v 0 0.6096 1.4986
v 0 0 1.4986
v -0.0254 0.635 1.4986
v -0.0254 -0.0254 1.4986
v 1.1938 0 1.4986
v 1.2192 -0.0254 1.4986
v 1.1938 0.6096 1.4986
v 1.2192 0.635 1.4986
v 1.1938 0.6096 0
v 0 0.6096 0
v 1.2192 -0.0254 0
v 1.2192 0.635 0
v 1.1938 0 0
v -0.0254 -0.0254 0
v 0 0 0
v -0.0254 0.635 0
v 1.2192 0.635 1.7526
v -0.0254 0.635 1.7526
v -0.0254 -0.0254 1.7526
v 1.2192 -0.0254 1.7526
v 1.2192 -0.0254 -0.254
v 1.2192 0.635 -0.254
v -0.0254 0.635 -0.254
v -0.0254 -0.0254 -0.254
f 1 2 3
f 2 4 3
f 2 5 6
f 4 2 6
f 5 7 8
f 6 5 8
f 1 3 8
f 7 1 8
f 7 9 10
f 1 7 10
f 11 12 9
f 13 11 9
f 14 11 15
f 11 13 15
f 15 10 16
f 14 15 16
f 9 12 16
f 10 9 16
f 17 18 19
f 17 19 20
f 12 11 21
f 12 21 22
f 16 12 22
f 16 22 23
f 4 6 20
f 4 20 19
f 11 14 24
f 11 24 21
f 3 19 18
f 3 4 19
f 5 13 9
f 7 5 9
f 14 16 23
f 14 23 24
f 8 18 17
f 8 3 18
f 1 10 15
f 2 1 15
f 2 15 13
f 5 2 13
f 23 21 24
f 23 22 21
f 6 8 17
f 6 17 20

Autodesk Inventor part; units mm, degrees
ref_plane "YZ Plane" through (0, 0, 0) normal (1, 0, 0) x (0, 1, 0)
ref_plane "XZ Plane" through (0, 0, 0) normal (0, 1, 0) x (-1, 0, 0)
ref_plane "XY Plane" through (0, 0, 0) normal (0, 0, 1) x (1, 0, 0)
sketch "Sketch1" plane through (0, 0, 0) normal (0, 0, 1) x (1, 0, 0)
  line L0 (0, 0) -> (1.1938, 0)
  line L1 (1.1938, 0) -> (1.1938, 0.6096)
  line L2 (1.1938, 0.6096) -> (0, 0.6096)
  line L3 (0, 0.6096) -> (0, 0)
  dimension "d0" = 0.6096
  dimension "d1" = 1.1938
extrude "Extrusion1" add sketch "Sketch1" along normal blind 1.4986
sketch "Sketch2" plane through (0, 0, 1.4986) normal (0, 0, 1) x (1, 0, 0)
  line L0 (-0.0254, 0.635) -> (1.2192, 0.635)
  line L1 (1.2192, 0.635) -> (1.2192, -0.0254)
  line L2 (1.2192, -0.0254) -> (-0.0254, -0.0254)
  line L3 (-0.0254, -0.0254) -> (-0.0254, 0.635)
  line L4 (1.1938, 0.6096) -> (0, 0.6096) projected
  line L5 (0, 0) -> (1.1938, 0) projected
  line L6 (1.1938, 0) -> (1.1938, 0.6096) projected
  line L7 (0, 0.6096) -> (0, 0) projected
  dimension "d4" = 0.0254
  dimension "d5" = 0.0254
  dimension "d6" = 0.0254
  dimension "d7" = 0.0254
extrude "Extrusion2" add sketch "Sketch2" along normal blind 0.254 contours L0 L1 L2 L3 | L6 L5 L7 L4
sketch "Sketch3" plane through (0, 0, 0) normal (0, 0, -1) x (-1, 0, 0)
  line L0 (0.0254, -0.0254) -> (-1.2192, -0.0254)
  line L1 (-1.2192, -0.0254) -> (-1.2192, 0.635)
  line L2 (-1.2192, 0.635) -> (0.0254, 0.635)
  line L3 (0.0254, 0.635) -> (0.0254, -0.0254)
  point P0 (0, 0)
extrude "Extrusion3" add sketch "Sketch3" along normal blind 0.254
properties part number "s220 Resistor"
